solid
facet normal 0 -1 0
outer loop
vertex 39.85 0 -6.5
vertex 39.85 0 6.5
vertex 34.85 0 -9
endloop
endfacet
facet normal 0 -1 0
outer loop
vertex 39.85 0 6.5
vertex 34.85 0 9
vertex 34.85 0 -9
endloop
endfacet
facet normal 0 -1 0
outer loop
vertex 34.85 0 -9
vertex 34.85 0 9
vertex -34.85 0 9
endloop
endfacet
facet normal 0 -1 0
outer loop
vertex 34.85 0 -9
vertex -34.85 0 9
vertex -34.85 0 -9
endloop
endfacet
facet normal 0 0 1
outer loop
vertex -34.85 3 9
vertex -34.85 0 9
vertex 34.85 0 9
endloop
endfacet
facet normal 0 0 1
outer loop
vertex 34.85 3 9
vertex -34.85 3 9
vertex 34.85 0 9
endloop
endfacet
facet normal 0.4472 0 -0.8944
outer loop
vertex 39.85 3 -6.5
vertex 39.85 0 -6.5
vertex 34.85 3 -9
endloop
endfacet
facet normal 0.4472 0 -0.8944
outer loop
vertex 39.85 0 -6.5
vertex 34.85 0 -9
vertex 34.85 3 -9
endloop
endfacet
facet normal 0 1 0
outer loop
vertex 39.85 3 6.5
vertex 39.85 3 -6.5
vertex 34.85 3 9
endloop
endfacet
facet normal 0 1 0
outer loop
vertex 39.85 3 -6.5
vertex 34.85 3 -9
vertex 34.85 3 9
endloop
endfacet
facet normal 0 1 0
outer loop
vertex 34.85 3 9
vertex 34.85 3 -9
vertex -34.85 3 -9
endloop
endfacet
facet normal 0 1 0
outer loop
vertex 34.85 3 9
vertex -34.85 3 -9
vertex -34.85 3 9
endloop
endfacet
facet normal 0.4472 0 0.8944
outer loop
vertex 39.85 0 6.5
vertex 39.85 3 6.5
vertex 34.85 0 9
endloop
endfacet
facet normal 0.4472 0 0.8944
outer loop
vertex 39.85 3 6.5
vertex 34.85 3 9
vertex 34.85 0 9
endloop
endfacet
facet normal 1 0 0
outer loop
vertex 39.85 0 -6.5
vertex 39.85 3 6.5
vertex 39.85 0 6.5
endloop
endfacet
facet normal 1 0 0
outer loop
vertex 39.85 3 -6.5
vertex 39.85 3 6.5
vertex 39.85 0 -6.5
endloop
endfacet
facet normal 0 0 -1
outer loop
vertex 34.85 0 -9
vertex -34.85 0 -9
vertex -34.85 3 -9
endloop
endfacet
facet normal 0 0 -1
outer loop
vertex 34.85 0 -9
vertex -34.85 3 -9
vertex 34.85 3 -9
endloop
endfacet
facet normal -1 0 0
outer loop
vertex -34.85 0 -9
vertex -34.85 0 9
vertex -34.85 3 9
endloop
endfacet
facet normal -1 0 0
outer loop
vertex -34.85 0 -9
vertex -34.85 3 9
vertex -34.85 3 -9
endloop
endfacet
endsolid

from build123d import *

# Parameters (mm, degrees)
SKETCH1_W           = 69.7
SKETCH1_H           = 18
BOSS_EXTRUDE1_DEPTH = 3
SKETCH3_W           = 13
SKETCH3_H           = 3


with BuildPart() as part:
    # Sketch1 → Boss-Extrude1 (new body)
    with BuildSketch(Plane(origin=(0, 0, 0), x_dir=(1, 0, 0), z_dir=(0, 1, 0))):
        Rectangle(SKETCH1_W, SKETCH1_H)
    extrude(amount=BOSS_EXTRUDE1_DEPTH)

    # Sketch3 → section 0 of loft1
    with BuildSketch(Plane(origin=(39.85, 0, 0), x_dir=(0, 0, -1), z_dir=(1, 0, 0)), mode=Mode.PRIVATE) as loft1_s0:
        with Locations((0, 1.5)):
            Rectangle(SKETCH3_W, SKETCH3_H)
    # loft up to a face of the part (loft1)
    loft([loft1_s0.sketch, part.faces().sort_by_distance((34.85, 1.5, 0))[0]])


solid = part.part
